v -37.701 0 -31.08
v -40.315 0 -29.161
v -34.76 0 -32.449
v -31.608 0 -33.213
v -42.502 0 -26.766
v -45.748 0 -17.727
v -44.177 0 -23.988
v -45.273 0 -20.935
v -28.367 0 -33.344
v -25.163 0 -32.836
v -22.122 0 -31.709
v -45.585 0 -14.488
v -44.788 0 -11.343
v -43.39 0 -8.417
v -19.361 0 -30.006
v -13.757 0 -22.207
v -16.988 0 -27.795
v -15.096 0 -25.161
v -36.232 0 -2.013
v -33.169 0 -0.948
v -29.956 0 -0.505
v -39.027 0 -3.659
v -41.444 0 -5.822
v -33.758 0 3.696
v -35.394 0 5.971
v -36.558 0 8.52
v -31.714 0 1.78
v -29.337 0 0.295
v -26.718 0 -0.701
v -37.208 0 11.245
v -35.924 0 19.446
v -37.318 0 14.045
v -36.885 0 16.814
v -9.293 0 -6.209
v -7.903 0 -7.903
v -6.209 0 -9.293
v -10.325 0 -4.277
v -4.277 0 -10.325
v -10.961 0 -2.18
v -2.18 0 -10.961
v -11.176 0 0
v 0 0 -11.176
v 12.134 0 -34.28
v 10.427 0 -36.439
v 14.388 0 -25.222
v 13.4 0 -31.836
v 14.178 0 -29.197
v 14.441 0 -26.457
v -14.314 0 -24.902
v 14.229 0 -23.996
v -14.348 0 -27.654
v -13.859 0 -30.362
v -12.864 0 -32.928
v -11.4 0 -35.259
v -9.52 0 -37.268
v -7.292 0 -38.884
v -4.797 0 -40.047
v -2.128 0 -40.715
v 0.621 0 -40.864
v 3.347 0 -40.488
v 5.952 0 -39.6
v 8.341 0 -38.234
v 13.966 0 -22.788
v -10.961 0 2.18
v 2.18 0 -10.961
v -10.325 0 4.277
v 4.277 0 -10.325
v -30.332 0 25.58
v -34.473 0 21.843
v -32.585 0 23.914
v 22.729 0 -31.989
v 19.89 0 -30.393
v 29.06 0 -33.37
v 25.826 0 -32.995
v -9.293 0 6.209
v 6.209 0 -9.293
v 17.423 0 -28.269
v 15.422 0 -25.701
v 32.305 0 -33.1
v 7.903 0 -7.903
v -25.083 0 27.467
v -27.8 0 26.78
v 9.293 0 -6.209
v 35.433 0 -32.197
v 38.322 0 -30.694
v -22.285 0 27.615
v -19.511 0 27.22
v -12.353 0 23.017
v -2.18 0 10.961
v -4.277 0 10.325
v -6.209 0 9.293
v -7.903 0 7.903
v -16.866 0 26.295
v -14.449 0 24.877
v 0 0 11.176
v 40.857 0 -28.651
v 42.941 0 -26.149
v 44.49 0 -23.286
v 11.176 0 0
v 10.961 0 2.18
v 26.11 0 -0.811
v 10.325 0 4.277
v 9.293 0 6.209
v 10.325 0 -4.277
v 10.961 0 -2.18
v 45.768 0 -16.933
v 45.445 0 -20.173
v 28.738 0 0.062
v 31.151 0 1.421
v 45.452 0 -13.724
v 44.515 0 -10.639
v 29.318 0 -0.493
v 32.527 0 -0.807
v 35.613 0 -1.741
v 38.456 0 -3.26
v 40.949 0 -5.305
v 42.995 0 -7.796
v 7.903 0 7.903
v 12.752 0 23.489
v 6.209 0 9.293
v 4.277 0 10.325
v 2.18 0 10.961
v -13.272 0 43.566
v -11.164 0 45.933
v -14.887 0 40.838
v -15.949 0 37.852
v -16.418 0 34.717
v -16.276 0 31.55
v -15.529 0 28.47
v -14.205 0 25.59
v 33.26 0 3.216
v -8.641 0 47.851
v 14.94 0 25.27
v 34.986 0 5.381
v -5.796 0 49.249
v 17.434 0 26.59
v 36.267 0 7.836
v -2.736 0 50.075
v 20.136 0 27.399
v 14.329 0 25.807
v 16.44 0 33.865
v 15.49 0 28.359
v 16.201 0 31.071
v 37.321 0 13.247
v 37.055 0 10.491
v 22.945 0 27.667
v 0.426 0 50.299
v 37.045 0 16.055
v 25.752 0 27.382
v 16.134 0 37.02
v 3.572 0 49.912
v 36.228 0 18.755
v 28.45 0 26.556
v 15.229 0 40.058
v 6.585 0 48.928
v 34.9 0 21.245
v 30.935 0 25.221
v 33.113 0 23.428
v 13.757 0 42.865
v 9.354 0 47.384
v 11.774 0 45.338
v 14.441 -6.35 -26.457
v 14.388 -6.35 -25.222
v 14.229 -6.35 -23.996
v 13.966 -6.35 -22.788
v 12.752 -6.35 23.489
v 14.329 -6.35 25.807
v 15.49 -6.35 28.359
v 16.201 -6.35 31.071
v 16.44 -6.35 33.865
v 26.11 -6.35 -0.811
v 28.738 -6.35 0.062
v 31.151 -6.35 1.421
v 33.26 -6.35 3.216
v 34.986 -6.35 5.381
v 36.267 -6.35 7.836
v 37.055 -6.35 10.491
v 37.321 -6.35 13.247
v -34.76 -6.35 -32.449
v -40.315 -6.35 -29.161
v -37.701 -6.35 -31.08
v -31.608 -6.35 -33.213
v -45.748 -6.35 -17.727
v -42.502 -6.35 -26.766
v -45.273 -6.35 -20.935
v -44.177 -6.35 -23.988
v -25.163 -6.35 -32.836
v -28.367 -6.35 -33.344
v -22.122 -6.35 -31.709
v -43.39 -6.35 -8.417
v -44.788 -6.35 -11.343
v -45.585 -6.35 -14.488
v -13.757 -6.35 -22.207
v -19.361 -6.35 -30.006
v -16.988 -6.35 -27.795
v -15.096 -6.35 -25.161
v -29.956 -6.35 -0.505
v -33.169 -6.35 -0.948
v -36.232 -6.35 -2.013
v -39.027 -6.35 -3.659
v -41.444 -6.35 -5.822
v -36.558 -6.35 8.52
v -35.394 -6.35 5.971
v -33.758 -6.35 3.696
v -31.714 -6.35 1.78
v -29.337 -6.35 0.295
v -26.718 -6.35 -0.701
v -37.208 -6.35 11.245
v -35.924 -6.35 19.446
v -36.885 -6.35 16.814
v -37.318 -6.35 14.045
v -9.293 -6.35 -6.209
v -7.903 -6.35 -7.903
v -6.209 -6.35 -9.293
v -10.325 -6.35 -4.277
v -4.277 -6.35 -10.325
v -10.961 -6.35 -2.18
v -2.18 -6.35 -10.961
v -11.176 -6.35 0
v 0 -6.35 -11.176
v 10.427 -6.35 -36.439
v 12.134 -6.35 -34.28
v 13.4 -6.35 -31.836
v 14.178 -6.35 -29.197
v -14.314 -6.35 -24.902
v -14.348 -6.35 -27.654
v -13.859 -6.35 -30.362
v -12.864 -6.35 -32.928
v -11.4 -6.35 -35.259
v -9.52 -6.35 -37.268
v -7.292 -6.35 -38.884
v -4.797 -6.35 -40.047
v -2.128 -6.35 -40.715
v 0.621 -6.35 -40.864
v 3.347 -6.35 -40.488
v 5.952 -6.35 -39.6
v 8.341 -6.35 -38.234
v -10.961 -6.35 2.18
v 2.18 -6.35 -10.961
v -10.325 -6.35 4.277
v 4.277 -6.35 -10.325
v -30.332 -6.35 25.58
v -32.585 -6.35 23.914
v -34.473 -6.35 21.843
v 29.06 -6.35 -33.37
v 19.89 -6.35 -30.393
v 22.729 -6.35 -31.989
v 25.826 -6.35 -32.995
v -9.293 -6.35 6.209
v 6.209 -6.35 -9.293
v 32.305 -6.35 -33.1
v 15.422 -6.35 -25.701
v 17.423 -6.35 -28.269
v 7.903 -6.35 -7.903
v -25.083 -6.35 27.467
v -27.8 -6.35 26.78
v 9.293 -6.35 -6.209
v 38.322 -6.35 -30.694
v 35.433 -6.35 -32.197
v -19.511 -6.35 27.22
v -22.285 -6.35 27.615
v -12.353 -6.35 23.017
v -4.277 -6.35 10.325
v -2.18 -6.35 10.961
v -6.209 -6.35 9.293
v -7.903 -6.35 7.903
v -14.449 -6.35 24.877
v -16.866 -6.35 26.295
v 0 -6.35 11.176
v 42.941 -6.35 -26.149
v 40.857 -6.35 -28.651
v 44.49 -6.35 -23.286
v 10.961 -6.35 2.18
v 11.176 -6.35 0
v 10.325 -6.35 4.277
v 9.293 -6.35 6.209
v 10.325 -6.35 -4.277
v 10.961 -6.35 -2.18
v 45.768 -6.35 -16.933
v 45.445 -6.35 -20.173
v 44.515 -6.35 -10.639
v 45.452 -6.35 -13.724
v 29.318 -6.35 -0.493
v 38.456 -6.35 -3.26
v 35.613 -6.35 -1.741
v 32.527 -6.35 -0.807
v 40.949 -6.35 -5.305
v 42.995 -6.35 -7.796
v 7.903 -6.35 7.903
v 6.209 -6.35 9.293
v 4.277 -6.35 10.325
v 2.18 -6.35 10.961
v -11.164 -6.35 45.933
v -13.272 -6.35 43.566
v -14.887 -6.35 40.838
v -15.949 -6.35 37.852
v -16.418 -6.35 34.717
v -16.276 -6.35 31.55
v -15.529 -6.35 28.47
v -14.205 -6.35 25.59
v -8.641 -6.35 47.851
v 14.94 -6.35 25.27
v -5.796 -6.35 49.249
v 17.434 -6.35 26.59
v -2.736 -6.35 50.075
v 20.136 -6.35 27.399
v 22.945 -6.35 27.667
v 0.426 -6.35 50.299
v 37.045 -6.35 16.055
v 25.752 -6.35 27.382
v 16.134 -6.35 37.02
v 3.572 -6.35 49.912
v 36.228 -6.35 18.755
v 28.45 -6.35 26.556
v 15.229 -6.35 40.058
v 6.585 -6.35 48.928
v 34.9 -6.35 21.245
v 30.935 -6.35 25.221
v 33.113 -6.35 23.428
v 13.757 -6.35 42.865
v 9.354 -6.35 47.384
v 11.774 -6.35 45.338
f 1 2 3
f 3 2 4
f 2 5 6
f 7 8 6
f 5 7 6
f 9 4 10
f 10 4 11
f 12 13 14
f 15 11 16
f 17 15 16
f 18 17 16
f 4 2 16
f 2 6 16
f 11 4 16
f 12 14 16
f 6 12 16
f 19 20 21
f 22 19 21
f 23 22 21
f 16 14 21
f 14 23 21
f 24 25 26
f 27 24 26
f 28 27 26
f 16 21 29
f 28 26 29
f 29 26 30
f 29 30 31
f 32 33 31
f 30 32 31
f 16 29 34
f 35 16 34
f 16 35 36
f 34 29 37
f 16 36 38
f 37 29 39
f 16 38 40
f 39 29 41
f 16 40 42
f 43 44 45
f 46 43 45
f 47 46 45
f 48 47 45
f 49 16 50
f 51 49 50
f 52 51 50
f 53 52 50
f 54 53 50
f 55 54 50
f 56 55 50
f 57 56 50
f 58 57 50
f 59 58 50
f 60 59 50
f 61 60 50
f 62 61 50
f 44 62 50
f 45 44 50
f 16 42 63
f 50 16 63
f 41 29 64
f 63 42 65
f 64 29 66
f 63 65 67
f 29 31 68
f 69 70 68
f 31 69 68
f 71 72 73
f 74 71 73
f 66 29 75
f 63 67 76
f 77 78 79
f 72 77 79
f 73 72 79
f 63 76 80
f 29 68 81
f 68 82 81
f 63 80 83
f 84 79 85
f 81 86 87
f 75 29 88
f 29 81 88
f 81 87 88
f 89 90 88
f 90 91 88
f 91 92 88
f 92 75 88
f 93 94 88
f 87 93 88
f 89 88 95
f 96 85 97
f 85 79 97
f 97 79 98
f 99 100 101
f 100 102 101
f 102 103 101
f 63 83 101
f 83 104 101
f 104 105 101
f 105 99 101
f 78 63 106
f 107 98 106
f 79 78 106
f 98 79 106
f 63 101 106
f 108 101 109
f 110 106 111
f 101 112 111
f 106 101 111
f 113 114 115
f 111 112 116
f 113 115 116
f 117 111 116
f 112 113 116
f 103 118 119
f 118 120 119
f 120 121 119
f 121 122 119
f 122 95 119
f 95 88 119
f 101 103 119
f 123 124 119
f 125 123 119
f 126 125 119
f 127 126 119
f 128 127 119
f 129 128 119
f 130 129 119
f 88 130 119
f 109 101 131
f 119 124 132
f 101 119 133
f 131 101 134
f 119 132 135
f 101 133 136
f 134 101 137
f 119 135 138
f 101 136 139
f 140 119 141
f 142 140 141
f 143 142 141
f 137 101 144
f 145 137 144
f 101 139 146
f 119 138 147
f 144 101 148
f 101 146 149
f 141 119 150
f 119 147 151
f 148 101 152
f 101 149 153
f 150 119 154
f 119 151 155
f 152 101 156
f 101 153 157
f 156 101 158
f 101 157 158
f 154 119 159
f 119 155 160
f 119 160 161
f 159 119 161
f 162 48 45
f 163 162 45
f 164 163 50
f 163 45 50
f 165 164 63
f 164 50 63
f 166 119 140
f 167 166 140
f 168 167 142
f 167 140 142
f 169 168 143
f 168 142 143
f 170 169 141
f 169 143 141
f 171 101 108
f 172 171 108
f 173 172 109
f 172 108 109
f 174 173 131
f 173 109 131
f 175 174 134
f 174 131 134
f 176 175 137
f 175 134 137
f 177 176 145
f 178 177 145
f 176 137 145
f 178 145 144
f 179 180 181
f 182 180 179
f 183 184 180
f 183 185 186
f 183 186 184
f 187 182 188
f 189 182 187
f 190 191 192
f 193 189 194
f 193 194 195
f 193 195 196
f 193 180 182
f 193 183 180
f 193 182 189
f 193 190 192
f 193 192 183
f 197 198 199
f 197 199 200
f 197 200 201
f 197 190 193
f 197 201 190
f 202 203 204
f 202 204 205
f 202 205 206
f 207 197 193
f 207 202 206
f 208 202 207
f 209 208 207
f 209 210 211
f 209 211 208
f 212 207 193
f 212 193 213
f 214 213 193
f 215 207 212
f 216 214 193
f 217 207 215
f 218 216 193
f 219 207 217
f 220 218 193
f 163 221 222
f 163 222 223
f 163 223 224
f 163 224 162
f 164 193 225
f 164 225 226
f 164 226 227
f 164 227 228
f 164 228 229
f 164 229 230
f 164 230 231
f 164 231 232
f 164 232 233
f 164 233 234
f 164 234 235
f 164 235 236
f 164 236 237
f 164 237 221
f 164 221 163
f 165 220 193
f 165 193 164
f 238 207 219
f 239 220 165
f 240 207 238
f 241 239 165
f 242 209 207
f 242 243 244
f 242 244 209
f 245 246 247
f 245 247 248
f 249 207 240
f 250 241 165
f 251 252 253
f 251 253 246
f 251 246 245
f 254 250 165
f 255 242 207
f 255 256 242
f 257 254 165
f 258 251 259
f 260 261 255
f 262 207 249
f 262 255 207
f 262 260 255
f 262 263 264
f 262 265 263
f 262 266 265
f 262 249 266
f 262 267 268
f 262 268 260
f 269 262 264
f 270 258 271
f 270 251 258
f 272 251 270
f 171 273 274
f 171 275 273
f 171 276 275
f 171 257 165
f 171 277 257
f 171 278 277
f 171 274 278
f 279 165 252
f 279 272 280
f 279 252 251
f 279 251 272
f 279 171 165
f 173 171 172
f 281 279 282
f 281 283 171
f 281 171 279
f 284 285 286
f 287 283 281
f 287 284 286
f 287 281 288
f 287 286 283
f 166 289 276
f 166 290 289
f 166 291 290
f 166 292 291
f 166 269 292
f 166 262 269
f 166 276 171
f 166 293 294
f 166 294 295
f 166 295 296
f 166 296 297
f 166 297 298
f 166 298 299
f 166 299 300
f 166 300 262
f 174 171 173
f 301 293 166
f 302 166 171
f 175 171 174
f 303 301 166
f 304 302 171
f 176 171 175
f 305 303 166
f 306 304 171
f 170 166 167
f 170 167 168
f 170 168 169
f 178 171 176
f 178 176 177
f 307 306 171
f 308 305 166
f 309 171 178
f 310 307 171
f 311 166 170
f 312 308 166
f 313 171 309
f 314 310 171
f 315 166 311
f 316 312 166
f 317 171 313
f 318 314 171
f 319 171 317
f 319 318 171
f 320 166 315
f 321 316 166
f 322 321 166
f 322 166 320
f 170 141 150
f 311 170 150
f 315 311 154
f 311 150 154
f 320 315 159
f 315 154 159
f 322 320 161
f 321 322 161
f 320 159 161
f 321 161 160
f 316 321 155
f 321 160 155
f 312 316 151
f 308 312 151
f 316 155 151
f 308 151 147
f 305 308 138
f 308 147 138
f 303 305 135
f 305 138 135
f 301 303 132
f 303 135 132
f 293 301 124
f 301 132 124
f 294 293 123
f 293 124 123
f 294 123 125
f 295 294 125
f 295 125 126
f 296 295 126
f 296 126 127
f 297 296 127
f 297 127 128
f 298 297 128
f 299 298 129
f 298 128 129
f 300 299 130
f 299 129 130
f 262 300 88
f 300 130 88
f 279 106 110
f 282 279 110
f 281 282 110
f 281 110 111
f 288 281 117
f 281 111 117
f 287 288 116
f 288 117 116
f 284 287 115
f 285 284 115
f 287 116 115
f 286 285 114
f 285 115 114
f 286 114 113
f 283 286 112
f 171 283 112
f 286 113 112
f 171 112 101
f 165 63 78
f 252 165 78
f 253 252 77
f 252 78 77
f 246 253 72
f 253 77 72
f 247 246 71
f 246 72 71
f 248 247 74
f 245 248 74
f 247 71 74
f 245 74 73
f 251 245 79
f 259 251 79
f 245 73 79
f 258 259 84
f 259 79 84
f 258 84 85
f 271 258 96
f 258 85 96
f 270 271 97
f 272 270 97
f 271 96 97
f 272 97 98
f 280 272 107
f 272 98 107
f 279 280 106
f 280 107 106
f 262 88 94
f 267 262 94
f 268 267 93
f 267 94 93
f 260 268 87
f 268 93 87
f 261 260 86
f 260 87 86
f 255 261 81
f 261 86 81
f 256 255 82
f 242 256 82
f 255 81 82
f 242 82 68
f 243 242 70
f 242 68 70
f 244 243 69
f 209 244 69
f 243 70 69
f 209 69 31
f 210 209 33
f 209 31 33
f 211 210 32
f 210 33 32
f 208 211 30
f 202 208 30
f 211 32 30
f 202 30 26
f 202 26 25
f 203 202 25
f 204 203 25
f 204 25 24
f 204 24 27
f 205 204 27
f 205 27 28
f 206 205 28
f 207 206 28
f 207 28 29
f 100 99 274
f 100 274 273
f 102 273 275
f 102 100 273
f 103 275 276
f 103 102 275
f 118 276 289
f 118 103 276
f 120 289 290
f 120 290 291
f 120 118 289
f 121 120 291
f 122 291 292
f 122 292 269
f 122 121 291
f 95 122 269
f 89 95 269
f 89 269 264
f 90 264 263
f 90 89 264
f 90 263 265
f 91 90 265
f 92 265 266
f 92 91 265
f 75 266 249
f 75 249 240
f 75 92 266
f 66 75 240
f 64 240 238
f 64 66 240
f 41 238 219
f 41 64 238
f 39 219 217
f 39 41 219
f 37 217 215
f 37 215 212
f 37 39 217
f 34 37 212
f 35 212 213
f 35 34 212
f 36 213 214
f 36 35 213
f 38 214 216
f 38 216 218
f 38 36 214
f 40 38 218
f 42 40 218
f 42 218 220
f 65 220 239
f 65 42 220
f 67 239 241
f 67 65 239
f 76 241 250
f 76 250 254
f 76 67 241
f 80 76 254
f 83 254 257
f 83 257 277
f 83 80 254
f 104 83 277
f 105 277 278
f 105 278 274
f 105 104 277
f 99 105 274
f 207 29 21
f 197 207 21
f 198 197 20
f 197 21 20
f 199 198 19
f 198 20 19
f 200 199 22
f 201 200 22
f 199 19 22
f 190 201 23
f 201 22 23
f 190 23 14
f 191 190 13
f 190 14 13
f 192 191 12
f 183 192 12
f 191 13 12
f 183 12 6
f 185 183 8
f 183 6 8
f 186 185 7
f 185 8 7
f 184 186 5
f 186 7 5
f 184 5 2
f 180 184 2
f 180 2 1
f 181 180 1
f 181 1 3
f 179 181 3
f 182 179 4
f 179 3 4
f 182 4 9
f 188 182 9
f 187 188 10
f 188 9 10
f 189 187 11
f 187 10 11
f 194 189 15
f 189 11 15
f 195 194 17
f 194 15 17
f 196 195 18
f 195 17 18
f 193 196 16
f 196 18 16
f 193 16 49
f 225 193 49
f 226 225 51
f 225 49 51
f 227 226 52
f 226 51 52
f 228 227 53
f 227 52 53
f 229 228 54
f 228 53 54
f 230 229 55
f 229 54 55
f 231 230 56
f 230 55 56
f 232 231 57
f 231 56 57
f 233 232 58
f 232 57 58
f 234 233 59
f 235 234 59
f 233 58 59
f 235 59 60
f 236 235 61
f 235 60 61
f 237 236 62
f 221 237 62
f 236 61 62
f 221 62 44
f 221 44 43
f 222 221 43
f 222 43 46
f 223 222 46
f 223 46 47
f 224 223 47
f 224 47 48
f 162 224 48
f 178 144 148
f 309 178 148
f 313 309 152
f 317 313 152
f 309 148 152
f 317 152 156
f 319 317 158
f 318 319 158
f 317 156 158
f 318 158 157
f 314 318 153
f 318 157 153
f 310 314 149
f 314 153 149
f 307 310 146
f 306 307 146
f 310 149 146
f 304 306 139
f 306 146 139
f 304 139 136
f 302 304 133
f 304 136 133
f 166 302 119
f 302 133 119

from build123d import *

# Parameters (mm, degrees)
F0_R     = 11.176
F1_DEPTH = 6.35


with BuildPart() as f1:
    # F0 (on Front) → F1 (new body)
    with BuildSketch(Plane.XZ):
        with BuildLine():
            ThreePointArc((12.7517006508, 23.4892014836), (15.490274076, 28.359134381), (16.4396849361, 33.8650085032))
            ThreePointArc((16.4396849361, 33.8650085032), (-5.7959286408, 49.2491058764), (-12.3528926478, 23.0174611293))
            ThreePointArc((-12.3528926478, 23.0174611293), (-12.2109180853, 22.8621908621), (-12.0712241226, 22.7048656287))
            ThreePointArc((-12.0712241226, 22.7048656287), (-0.3017671927, 17.4280934228), (11.6534468913, 22.2693016964))
            ThreePointArc((11.6534468913, 22.2693016964), (12.1852012792, 22.8948917308), (12.7517006508, 23.4892014836))
        make_face()
        with BuildLine():
            ThreePointArc((-12.0712241226, 22.7048656287), (-12.2109180853, 22.8621908621), (-12.3528926478, 23.0174611293))
            ThreePointArc((-12.3528926478, 23.0174611293), (-12.2130585437, 22.8602621723), (-12.0712241226, 22.7048656287))
        make_face()
        with BuildLine():
            ThreePointArc((-12.0712241226, 22.7048656287), (-12.2130585437, 22.8602621723), (-12.3528926478, 23.0174611293))
            ThreePointArc((-12.3528926478, 23.0174611293), (-35.2568762282, 20.6796890684), (-26.7180955248, -0.7013040367))
            ThreePointArc((-26.7180955248, -0.7013040367), (-25.9110393194, -0.8518354275), (-25.1125044392, -1.0424697987))
            ThreePointArc((-25.1125044392, -1.0424697987), (-13.5329586121, 2.2669935247), (-8.5036933239, 13.2097957122))
            ThreePointArc((-8.5036933239, 13.2097957122), (-9.4250093039, 18.2813740839), (-12.0712241226, 22.7048656287))
        make_face()
        with BuildLine():
            ThreePointArc((37.321032921, 13.2471223209), (28.4497702153, 26.5564449349), (12.7517006508, 23.4892014836))
            ThreePointArc((12.7517006508, 23.4892014836), (12.2178085396, 22.8655360028), (11.6534468913, 22.2693016964))
            ThreePointArc((11.6534468913, 22.2693016964), (10.5710761807, 5.7719047545), (25.6986024853, -0.8984460694))
            ThreePointArc((25.6986024853, -0.8984460694), (25.9040970502, -0.8533121295), (26.1101523925, -0.8108117214))
            ThreePointArc((26.1101523925, -0.8108117214), (34.1751435518, 4.2567197748), (37.321032921, 13.2471223209))
        make_face()
        with BuildLine():
            ThreePointArc((11.6534468913, 22.2693016964), (12.2178085396, 22.8655360028), (12.7517006508, 23.4892014836))
            ThreePointArc((12.7517006508, 23.4892014836), (12.1852012792, 22.8948917308), (11.6534468913, 22.2693016964))
        make_face()
        with BuildLine():
            ThreePointArc((-25.1125044392, -1.0424697987), (-25.9201584954, -0.8947520073), (-26.7180955248, -0.7013040367))
            ThreePointArc((-26.7180955248, -0.7013040367), (-43.4081977491, -25.41837957), (-13.7572597447, -22.2066494078))
            ThreePointArc((-13.7572597447, -22.2066494078), (-13.6937790301, -22.0060606965), (-13.6273783627, -21.8064195594))
            ThreePointArc((-13.6273783627, -21.8064195594), (-13.0740993856, -19.3973230871), (-12.8882727271, -16.9325042516))
            ThreePointArc((-12.8882727271, -16.9325042516), (-16.2979161501, -6.9084701851), (-25.1125044392, -1.0424697987))
        make_face()
        with BuildLine():
            ThreePointArc((-25.1125044392, -1.0424697987), (-25.9110393194, -0.8518354275), (-26.7180955248, -0.7013040367))
            ThreePointArc((-26.7180955248, -0.7013040367), (-25.9201584954, -0.8947520073), (-25.1125044392, -1.0424697987))
        make_face()
        with BuildLine():
            ThreePointArc((-13.6273783627, -21.8064195594), (-13.6937790301, -22.0060606965), (-13.7572597447, -22.2066494078))
            ThreePointArc((-13.7572597447, -22.2066494078), (-13.6910385066, -22.0069500429), (-13.6273783627, -21.8064195594))
        make_face()
        with BuildLine():
            ThreePointArc((-13.6273783627, -21.8064195594), (-13.6910385066, -22.0069500429), (-13.7572597447, -22.2066494078))
            ThreePointArc((-13.7572597447, -22.2066494078), (-2.127588621, -40.7153049273), (14.44099559, -26.4569180331))
            ThreePointArc((14.44099559, -26.4569180331), (14.3218531968, -24.6071235917), (13.966394874, -22.7878974469))
            ThreePointArc((13.966394874, -22.7878974469), (13.6932307798, -22.0137005753), (13.459057548, -21.2268318977))
            ThreePointArc((13.459057548, -21.2268318977), (-0.2869219447, -12.0407728951), (-13.6273783627, -21.8064195594))
        make_face()
        with BuildLine():
            ThreePointArc((26.1101523925, -0.8108117214), (25.9046971154, -0.8561301656), (25.6986024853, -0.8984460694))
            ThreePointArc((25.6986024853, -0.8984460694), (15.24405524, -8.4527086566), (13.459057548, -21.2268318977))
            ThreePointArc((13.459057548, -21.2268318977), (13.7349572161, -22.0001397234), (13.966394874, -22.7878974469))
            ThreePointArc((13.966394874, -22.7878974469), (32.3048678413, -33.100412174), (45.7676425992, -16.9325042516))
            ThreePointArc((45.7676425992, -16.9325042516), (39.7530124822, -4.2210341235), (26.1101523925, -0.8108117214))
        make_face()
        with BuildLine():
            ThreePointArc((26.1101523925, -0.8108117214), (25.9040970502, -0.8533121295), (25.6986024853, -0.8984460694))
            ThreePointArc((25.6986024853, -0.8984460694), (25.9046971154, -0.8561301656), (26.1101523925, -0.8108117214))
        make_face()
        with BuildLine():
            ThreePointArc((13.966394874, -22.7878974469), (13.7349572161, -22.0001397234), (13.459057548, -21.2268318977))
            ThreePointArc((13.459057548, -21.2268318977), (13.6932307798, -22.0137005753), (13.966394874, -22.7878974469))
        make_face()
        with BuildLine():
            ThreePointArc((11.6534468913, 22.2693016964), (-0.3017671927, 17.4280934228), (-12.0712241226, 22.7048656287))
            ThreePointArc((-12.0712241226, 22.7048656287), (-9.4250093039, 18.2813740839), (-8.5036933239, 13.2097957122))
            ThreePointArc((-8.5036933239, 13.2097957122), (-13.5329586121, 2.2669935247), (-25.1125044392, -1.0424697987))
            ThreePointArc((-25.1125044392, -1.0424697987), (-16.2979161501, -6.9084701851), (-12.8882727271, -16.9325042516))
            ThreePointArc((-12.8882727271, -16.9325042516), (-13.0740993856, -19.3973230871), (-13.6273783627, -21.8064195594))
            ThreePointArc((-13.6273783627, -21.8064195594), (-0.2869219447, -12.0407728951), (13.459057548, -21.2268318977))
            ThreePointArc((13.459057548, -21.2268318977), (15.24405524, -8.4527086566), (25.6986024853, -0.8984460694))
            ThreePointArc((25.6986024853, -0.8984460694), (10.5710761807, 5.7719047545), (11.6534468913, 22.2693016964))
        make_face()
        Circle(F0_R, mode=Mode.SUBTRACT)
    extrude(amount=F1_DEPTH)


solid = f1.part
